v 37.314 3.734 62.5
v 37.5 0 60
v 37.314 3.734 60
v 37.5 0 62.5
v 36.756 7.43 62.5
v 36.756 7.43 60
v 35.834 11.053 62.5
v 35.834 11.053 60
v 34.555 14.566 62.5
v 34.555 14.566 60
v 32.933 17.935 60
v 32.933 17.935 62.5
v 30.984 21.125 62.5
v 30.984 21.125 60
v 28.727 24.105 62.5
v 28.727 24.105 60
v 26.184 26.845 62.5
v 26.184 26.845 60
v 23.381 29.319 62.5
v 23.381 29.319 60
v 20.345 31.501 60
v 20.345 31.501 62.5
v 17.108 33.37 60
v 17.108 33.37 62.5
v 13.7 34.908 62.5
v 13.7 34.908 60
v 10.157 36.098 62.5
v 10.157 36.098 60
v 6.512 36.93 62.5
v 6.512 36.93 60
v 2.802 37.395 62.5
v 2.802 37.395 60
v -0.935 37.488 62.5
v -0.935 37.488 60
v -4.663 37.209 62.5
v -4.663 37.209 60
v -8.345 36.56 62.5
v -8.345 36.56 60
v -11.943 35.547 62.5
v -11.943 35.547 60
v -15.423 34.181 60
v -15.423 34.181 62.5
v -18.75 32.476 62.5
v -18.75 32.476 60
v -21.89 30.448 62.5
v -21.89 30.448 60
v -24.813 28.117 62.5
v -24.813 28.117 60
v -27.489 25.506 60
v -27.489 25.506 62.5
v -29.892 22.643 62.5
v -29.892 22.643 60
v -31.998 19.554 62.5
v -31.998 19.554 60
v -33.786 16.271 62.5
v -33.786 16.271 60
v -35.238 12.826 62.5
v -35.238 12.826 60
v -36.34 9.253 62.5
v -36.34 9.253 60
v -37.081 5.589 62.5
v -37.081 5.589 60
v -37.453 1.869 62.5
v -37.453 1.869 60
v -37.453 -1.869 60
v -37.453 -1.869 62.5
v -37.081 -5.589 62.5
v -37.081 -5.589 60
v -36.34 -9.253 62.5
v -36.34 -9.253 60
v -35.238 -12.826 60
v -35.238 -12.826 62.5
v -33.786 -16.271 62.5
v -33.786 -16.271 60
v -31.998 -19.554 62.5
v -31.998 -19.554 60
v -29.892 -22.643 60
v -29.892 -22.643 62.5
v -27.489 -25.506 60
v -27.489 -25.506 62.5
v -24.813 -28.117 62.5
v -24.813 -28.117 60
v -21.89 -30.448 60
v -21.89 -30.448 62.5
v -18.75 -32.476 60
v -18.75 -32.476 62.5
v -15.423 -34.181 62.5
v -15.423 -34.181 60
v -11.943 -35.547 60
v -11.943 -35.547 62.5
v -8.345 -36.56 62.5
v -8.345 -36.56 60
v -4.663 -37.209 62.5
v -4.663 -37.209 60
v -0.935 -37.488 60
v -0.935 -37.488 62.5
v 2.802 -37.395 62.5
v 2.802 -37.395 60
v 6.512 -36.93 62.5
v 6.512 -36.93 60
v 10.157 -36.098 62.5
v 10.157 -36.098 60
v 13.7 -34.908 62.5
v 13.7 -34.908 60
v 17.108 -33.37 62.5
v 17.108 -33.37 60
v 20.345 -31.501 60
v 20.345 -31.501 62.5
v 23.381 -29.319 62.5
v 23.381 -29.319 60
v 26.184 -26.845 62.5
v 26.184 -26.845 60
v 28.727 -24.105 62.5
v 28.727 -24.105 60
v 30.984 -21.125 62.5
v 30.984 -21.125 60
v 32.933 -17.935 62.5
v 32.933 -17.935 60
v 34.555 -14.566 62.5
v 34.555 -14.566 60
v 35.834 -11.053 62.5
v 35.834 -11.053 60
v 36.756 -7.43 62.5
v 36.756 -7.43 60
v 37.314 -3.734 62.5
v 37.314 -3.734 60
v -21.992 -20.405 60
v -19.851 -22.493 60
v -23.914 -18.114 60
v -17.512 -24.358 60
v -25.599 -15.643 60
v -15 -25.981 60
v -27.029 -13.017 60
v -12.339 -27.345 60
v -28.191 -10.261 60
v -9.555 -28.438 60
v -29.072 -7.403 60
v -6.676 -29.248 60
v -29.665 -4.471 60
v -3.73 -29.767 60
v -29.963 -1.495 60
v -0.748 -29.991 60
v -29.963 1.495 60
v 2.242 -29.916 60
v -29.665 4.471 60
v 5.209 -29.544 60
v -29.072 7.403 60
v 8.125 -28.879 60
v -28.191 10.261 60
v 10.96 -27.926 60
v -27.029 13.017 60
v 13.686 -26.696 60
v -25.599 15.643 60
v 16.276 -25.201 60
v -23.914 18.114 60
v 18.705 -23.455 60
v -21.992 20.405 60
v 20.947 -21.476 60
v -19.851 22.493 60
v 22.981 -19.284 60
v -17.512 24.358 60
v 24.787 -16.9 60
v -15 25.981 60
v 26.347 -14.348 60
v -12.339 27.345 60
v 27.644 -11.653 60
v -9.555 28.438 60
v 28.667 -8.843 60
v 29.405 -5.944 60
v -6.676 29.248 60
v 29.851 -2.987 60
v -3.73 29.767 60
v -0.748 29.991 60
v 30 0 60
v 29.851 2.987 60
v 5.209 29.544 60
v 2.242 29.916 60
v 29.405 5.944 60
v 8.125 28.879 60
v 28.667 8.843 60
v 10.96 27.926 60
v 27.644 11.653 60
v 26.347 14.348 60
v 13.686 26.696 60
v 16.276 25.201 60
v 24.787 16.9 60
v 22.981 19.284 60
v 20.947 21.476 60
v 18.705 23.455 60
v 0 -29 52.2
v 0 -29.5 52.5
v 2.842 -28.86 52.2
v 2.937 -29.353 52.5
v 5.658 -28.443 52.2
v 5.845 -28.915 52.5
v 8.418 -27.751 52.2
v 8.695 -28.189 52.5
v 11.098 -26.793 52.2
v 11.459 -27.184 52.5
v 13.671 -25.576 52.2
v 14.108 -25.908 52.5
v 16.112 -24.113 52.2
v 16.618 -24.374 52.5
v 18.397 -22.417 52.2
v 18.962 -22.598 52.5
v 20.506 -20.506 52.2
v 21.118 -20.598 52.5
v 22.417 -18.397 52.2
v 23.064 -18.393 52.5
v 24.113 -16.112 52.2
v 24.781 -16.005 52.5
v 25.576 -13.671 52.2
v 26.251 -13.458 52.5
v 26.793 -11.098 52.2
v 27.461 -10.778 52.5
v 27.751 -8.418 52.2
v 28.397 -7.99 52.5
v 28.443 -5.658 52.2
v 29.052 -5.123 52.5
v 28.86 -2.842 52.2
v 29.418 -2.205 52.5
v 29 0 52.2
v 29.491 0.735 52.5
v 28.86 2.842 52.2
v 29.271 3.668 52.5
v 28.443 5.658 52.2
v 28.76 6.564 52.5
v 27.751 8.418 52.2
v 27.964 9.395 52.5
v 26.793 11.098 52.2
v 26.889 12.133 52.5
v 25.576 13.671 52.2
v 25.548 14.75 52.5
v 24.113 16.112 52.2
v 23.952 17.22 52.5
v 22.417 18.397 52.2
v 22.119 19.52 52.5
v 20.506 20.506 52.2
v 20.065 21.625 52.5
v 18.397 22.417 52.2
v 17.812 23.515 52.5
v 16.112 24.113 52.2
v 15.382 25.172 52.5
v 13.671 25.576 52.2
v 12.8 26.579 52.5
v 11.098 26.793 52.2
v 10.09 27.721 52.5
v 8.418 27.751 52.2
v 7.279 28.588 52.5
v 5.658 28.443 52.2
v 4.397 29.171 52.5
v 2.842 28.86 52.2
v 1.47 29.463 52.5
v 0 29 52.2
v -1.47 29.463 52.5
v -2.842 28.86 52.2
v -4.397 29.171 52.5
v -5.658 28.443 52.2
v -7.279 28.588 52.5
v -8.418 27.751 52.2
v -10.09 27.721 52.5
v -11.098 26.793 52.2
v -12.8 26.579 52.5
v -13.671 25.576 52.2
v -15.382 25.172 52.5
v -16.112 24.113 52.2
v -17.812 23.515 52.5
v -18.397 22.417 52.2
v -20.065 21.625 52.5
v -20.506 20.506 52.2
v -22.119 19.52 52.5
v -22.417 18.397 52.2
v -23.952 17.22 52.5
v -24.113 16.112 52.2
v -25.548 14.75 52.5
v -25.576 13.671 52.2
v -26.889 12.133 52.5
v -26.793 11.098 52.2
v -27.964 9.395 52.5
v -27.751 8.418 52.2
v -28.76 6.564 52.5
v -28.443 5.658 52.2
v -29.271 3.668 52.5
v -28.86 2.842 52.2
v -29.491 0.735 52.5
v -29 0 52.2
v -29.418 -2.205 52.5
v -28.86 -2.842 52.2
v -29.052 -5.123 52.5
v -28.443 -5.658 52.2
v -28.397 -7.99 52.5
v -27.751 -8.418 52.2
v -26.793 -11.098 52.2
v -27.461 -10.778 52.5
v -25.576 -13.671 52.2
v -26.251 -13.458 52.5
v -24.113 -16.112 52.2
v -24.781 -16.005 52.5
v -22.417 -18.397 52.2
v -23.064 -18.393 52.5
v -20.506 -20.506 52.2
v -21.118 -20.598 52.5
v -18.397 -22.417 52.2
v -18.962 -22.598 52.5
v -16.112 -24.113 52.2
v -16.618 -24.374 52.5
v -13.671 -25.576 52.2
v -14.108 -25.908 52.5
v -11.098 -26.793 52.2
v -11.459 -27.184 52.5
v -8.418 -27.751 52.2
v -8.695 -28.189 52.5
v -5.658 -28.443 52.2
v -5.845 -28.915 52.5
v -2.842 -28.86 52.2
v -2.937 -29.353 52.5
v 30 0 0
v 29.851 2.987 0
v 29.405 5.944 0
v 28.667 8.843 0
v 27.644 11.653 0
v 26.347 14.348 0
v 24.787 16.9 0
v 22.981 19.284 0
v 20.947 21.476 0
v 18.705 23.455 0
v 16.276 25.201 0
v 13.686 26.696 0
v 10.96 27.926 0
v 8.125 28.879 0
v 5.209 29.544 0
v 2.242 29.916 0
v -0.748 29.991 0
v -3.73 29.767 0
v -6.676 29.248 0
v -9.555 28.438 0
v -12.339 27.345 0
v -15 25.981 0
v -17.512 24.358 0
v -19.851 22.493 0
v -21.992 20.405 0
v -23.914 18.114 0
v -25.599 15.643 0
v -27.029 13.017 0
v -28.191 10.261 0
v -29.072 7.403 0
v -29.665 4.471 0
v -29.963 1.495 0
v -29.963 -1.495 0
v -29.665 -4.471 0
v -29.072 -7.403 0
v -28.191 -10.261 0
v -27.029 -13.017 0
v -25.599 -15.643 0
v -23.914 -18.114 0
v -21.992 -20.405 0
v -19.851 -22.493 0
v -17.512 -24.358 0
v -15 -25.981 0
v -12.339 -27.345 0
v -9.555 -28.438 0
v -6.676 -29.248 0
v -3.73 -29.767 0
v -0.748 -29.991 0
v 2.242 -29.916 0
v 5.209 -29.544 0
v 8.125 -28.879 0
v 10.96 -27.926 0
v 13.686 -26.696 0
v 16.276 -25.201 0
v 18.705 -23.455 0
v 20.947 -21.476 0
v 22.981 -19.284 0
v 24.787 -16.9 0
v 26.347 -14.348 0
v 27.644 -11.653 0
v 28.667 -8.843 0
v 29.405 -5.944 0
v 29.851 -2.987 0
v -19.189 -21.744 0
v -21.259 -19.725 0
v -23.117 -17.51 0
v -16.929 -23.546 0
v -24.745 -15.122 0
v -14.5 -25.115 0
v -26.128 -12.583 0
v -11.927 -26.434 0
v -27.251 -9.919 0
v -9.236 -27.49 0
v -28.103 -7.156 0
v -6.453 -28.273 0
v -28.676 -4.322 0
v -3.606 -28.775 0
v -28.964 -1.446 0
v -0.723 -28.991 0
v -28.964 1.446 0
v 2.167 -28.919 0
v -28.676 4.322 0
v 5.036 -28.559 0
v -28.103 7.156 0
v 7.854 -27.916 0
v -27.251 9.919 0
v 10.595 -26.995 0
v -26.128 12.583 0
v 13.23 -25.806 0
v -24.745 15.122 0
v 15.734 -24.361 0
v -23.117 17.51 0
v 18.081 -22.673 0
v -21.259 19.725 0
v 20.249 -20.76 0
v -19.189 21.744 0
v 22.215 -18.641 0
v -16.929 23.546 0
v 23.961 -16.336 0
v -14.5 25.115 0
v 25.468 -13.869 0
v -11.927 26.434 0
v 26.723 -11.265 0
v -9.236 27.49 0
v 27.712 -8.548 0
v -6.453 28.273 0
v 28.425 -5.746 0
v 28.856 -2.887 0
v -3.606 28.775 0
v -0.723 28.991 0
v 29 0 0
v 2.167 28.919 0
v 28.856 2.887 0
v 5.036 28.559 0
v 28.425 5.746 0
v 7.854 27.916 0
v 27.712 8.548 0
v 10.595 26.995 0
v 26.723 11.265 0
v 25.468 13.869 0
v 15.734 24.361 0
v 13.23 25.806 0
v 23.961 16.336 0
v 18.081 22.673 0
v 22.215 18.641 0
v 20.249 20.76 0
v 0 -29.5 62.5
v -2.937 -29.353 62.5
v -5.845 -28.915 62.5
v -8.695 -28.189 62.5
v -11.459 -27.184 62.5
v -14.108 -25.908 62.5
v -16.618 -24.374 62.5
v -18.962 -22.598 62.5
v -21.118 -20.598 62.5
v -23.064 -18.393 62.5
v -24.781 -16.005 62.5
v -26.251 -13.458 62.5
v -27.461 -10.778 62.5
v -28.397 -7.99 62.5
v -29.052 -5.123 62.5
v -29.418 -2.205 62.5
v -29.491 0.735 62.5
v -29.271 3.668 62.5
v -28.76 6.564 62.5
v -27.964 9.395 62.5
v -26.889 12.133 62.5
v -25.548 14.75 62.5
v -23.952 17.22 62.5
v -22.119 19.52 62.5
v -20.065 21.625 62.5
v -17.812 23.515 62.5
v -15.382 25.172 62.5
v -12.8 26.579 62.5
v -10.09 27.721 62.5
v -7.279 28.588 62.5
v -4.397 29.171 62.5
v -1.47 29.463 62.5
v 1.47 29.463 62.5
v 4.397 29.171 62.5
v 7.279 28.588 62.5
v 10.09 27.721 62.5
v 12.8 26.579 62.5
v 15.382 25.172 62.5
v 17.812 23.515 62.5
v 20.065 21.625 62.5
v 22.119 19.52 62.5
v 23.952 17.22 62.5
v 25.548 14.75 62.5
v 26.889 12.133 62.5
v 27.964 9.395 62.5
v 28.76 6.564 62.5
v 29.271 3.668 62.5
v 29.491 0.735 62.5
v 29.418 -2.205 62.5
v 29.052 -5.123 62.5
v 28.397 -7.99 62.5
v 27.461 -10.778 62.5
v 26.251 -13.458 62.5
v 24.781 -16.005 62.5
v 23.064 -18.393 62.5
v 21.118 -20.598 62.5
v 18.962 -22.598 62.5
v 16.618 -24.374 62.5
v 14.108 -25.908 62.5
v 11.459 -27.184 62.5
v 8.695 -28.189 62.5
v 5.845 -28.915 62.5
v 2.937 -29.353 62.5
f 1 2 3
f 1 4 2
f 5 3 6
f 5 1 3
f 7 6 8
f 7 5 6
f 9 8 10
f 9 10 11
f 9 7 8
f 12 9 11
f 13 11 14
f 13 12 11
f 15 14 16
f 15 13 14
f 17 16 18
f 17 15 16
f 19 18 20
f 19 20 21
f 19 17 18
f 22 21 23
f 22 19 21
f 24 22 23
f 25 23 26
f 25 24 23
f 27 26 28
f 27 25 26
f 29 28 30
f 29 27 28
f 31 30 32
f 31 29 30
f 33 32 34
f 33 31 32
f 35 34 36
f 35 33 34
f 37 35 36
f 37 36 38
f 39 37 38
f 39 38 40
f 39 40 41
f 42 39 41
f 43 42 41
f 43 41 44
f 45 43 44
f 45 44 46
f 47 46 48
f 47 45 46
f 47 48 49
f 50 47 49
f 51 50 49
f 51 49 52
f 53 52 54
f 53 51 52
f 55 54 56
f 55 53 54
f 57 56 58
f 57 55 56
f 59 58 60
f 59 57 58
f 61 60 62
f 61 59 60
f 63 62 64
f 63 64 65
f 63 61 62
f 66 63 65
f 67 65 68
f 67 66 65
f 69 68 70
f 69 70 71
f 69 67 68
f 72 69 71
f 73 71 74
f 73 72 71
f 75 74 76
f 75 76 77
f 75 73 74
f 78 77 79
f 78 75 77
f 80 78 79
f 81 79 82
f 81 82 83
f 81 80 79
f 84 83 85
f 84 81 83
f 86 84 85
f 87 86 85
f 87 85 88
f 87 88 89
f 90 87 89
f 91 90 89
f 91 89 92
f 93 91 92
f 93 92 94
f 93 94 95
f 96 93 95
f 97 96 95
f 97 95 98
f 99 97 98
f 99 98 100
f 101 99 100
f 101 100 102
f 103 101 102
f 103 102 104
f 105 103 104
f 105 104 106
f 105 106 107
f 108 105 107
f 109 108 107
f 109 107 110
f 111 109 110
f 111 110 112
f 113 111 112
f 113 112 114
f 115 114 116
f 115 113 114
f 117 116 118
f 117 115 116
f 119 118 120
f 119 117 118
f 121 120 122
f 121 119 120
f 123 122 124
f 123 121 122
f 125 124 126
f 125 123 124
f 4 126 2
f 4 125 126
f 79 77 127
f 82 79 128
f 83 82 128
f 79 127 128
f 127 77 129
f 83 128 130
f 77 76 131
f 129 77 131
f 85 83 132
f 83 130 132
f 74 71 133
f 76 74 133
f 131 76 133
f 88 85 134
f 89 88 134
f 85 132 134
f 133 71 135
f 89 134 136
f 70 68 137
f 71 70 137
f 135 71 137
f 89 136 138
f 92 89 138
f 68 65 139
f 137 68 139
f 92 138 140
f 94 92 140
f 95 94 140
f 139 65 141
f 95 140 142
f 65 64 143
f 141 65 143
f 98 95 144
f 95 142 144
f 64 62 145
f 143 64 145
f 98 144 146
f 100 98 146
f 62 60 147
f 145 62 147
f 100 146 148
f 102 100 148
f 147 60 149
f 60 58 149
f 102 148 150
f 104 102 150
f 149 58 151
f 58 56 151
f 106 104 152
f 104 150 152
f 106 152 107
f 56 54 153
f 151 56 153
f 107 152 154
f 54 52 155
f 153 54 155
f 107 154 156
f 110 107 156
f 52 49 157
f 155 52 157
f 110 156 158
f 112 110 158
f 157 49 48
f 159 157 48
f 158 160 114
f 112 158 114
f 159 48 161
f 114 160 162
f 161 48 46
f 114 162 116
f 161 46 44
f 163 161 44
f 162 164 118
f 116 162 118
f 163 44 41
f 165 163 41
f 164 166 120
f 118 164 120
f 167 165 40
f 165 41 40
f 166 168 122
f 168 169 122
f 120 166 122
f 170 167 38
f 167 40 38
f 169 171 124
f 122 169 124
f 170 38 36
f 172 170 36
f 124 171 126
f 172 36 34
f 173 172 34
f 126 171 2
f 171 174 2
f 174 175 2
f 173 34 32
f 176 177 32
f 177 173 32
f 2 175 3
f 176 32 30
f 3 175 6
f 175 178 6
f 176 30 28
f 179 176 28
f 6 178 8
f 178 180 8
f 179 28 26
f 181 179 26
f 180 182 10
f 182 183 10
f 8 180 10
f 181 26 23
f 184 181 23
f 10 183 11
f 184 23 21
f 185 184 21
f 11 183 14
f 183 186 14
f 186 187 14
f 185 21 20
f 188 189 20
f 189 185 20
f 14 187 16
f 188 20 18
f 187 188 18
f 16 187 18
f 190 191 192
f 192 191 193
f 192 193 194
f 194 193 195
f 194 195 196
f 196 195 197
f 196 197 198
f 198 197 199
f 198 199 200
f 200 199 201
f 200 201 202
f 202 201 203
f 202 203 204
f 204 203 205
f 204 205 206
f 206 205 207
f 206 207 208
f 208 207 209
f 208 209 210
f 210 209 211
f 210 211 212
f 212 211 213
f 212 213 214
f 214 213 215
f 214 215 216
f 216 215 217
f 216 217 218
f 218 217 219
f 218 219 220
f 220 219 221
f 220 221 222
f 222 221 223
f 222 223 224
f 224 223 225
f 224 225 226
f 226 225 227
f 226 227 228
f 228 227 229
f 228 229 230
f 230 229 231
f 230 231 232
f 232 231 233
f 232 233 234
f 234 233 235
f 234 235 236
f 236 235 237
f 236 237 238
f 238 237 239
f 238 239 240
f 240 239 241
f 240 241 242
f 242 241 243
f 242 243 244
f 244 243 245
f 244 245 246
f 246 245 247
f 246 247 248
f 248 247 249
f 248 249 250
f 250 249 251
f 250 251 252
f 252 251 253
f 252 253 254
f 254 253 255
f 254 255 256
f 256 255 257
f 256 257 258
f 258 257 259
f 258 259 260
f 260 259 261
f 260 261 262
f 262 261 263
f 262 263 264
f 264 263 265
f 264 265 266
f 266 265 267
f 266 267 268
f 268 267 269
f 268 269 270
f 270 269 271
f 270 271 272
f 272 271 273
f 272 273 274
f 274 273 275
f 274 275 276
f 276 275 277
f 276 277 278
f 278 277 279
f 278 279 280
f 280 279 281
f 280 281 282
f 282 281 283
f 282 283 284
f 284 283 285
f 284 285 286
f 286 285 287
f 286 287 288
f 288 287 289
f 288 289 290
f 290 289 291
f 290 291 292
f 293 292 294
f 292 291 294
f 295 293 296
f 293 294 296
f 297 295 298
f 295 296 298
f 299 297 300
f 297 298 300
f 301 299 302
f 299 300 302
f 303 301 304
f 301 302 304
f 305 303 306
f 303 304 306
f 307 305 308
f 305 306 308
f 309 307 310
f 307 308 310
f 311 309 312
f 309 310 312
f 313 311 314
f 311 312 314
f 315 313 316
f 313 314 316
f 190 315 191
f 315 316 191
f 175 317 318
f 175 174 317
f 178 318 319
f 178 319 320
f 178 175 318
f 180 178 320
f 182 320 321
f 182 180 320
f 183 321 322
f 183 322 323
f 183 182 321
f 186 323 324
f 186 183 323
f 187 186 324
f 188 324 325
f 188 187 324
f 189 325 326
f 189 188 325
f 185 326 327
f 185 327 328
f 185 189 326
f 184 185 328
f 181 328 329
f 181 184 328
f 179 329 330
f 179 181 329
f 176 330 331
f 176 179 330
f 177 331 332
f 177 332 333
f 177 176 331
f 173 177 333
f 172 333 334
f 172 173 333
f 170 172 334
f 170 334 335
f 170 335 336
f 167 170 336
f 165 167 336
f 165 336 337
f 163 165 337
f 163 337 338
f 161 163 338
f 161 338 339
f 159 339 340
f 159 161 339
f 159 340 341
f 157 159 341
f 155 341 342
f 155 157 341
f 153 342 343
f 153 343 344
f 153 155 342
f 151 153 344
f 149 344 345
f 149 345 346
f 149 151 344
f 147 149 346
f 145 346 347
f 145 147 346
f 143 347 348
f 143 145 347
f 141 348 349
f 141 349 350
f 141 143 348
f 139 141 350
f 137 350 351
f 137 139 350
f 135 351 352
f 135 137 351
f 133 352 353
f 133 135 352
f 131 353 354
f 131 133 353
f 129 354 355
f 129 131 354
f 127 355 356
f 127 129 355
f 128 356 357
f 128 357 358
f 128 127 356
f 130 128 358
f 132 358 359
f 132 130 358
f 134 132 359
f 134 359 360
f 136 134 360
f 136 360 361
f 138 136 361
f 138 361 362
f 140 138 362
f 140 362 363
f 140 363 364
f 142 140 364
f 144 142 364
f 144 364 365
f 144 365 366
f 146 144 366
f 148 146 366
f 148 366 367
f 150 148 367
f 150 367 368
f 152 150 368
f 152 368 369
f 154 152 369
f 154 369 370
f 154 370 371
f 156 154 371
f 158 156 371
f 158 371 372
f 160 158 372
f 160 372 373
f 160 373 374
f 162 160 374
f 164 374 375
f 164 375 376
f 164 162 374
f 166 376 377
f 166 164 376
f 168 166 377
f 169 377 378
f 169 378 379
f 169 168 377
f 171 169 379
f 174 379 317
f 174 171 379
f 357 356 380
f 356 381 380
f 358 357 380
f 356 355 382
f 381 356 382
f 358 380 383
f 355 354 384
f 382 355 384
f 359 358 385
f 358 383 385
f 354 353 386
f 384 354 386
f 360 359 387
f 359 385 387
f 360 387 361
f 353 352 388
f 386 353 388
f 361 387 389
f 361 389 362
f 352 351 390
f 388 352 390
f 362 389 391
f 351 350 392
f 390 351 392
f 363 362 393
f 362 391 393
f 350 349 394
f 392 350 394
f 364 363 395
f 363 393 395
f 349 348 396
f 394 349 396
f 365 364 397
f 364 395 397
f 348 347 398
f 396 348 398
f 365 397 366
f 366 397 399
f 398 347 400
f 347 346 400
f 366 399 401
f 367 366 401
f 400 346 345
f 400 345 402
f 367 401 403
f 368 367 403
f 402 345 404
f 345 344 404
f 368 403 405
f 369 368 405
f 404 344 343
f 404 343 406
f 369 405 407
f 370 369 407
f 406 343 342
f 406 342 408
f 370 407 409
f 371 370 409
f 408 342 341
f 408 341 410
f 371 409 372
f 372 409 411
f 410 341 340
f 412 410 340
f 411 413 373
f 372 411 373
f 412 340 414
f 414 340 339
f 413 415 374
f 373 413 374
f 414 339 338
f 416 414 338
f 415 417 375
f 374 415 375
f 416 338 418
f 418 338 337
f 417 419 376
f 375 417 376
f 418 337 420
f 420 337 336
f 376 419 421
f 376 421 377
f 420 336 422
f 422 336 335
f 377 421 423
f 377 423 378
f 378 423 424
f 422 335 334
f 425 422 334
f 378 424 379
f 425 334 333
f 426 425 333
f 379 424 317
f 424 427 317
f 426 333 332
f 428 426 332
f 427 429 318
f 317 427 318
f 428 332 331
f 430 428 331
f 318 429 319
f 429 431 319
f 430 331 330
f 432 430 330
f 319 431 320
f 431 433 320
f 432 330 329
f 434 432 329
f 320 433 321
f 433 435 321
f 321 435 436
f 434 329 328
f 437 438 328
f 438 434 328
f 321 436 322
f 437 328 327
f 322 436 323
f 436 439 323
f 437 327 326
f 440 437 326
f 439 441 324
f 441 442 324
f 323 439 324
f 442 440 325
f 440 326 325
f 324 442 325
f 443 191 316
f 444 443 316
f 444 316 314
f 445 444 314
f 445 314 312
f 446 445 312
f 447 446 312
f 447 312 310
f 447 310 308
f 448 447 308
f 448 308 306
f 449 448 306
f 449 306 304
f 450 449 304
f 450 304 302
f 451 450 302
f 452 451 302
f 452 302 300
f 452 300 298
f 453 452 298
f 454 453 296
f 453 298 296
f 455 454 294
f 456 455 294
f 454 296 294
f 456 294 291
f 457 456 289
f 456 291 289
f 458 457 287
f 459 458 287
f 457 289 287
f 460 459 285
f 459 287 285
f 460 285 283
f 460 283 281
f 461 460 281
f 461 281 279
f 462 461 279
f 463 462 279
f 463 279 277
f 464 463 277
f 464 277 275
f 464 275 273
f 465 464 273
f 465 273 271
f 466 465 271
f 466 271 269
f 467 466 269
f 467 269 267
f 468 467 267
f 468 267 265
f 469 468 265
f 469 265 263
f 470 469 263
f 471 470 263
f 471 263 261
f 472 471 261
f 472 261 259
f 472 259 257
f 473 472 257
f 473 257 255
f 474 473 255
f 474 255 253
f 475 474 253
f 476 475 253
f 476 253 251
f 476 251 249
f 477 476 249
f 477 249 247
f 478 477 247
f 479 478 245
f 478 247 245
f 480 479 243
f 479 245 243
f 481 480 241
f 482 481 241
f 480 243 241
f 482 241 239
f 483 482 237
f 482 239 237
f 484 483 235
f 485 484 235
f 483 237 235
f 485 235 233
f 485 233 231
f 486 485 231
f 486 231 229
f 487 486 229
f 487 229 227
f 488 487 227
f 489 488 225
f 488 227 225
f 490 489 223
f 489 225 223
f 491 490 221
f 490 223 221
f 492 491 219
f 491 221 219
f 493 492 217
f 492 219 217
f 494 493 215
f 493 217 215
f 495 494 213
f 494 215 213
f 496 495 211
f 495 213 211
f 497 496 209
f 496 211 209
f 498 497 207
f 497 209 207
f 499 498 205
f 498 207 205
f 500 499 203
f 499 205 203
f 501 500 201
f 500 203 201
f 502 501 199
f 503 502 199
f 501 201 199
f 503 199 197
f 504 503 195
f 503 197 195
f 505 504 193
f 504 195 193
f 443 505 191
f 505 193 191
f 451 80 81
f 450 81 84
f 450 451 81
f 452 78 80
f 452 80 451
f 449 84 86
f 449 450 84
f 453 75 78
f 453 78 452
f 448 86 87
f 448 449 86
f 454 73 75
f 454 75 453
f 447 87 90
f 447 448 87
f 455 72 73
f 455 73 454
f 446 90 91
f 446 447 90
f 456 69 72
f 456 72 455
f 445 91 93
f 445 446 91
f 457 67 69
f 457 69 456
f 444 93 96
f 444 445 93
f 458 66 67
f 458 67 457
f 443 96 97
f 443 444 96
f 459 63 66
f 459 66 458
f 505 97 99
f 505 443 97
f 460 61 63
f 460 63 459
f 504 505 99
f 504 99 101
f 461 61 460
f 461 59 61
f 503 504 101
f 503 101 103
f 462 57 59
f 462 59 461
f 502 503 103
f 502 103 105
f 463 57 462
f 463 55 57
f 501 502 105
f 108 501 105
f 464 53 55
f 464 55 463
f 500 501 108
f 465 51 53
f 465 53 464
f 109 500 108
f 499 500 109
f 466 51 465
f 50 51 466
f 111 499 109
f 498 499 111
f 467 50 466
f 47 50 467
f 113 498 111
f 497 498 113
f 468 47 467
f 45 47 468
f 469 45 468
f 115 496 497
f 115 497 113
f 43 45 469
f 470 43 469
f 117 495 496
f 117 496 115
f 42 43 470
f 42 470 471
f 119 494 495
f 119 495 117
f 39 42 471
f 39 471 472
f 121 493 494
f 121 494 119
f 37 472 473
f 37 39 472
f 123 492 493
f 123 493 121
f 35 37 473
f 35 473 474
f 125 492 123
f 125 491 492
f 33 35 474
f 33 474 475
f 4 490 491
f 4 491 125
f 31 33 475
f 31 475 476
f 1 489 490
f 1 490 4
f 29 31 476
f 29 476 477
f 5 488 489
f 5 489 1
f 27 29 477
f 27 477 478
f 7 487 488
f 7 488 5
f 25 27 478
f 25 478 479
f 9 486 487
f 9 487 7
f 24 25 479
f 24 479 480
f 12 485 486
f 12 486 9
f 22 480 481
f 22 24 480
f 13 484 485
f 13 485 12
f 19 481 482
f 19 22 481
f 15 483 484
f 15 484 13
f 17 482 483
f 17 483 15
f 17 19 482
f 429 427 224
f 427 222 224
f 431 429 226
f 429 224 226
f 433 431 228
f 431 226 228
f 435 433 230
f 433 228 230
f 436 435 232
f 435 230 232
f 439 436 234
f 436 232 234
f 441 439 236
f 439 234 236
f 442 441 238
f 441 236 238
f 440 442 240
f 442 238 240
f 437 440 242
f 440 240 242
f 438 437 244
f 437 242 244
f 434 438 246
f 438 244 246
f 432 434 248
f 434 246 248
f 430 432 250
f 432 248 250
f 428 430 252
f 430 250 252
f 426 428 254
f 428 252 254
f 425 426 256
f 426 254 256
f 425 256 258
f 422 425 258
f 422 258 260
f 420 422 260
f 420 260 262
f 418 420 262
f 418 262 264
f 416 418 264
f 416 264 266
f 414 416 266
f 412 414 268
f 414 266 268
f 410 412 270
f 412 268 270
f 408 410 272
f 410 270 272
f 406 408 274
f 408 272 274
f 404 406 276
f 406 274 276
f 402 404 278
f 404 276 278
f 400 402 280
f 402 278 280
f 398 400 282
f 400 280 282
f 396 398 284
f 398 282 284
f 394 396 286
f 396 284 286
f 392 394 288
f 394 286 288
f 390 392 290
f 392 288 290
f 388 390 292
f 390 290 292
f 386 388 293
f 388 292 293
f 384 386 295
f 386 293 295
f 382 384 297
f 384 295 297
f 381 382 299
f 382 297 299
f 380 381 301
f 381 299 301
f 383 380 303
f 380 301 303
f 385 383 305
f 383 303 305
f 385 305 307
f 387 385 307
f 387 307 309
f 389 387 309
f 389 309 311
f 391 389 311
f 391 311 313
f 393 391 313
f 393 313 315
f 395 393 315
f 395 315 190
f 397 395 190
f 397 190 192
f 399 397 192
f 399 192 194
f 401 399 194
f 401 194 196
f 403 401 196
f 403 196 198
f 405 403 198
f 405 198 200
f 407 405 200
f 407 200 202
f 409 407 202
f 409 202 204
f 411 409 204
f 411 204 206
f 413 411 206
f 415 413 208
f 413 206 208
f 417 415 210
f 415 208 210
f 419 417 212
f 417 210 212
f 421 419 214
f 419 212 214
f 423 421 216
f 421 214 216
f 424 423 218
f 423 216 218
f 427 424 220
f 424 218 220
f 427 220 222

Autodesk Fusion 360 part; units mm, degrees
cylinder "CylindrePrimitive1" add diameter 60 height 60 placed x (1, 0, 0) y (0, 1, 0) z (0, 0, 1) at (0, 0, 0)
shell "Coque1" thickness 1 removed faces 1 at (7.6631, 11.2397, 0)
cylinder "CylindrePrimitive2" add diameter 75 height 2.5 placed x (1, 0, 0) y (0, 1, 0) z (0, 0, 1) at (0, 0, 60)
hole "Perçage1" at (0, 0, 62.5) direction (0, 0, -1) diameter 59 depth 10 tip angle 118
